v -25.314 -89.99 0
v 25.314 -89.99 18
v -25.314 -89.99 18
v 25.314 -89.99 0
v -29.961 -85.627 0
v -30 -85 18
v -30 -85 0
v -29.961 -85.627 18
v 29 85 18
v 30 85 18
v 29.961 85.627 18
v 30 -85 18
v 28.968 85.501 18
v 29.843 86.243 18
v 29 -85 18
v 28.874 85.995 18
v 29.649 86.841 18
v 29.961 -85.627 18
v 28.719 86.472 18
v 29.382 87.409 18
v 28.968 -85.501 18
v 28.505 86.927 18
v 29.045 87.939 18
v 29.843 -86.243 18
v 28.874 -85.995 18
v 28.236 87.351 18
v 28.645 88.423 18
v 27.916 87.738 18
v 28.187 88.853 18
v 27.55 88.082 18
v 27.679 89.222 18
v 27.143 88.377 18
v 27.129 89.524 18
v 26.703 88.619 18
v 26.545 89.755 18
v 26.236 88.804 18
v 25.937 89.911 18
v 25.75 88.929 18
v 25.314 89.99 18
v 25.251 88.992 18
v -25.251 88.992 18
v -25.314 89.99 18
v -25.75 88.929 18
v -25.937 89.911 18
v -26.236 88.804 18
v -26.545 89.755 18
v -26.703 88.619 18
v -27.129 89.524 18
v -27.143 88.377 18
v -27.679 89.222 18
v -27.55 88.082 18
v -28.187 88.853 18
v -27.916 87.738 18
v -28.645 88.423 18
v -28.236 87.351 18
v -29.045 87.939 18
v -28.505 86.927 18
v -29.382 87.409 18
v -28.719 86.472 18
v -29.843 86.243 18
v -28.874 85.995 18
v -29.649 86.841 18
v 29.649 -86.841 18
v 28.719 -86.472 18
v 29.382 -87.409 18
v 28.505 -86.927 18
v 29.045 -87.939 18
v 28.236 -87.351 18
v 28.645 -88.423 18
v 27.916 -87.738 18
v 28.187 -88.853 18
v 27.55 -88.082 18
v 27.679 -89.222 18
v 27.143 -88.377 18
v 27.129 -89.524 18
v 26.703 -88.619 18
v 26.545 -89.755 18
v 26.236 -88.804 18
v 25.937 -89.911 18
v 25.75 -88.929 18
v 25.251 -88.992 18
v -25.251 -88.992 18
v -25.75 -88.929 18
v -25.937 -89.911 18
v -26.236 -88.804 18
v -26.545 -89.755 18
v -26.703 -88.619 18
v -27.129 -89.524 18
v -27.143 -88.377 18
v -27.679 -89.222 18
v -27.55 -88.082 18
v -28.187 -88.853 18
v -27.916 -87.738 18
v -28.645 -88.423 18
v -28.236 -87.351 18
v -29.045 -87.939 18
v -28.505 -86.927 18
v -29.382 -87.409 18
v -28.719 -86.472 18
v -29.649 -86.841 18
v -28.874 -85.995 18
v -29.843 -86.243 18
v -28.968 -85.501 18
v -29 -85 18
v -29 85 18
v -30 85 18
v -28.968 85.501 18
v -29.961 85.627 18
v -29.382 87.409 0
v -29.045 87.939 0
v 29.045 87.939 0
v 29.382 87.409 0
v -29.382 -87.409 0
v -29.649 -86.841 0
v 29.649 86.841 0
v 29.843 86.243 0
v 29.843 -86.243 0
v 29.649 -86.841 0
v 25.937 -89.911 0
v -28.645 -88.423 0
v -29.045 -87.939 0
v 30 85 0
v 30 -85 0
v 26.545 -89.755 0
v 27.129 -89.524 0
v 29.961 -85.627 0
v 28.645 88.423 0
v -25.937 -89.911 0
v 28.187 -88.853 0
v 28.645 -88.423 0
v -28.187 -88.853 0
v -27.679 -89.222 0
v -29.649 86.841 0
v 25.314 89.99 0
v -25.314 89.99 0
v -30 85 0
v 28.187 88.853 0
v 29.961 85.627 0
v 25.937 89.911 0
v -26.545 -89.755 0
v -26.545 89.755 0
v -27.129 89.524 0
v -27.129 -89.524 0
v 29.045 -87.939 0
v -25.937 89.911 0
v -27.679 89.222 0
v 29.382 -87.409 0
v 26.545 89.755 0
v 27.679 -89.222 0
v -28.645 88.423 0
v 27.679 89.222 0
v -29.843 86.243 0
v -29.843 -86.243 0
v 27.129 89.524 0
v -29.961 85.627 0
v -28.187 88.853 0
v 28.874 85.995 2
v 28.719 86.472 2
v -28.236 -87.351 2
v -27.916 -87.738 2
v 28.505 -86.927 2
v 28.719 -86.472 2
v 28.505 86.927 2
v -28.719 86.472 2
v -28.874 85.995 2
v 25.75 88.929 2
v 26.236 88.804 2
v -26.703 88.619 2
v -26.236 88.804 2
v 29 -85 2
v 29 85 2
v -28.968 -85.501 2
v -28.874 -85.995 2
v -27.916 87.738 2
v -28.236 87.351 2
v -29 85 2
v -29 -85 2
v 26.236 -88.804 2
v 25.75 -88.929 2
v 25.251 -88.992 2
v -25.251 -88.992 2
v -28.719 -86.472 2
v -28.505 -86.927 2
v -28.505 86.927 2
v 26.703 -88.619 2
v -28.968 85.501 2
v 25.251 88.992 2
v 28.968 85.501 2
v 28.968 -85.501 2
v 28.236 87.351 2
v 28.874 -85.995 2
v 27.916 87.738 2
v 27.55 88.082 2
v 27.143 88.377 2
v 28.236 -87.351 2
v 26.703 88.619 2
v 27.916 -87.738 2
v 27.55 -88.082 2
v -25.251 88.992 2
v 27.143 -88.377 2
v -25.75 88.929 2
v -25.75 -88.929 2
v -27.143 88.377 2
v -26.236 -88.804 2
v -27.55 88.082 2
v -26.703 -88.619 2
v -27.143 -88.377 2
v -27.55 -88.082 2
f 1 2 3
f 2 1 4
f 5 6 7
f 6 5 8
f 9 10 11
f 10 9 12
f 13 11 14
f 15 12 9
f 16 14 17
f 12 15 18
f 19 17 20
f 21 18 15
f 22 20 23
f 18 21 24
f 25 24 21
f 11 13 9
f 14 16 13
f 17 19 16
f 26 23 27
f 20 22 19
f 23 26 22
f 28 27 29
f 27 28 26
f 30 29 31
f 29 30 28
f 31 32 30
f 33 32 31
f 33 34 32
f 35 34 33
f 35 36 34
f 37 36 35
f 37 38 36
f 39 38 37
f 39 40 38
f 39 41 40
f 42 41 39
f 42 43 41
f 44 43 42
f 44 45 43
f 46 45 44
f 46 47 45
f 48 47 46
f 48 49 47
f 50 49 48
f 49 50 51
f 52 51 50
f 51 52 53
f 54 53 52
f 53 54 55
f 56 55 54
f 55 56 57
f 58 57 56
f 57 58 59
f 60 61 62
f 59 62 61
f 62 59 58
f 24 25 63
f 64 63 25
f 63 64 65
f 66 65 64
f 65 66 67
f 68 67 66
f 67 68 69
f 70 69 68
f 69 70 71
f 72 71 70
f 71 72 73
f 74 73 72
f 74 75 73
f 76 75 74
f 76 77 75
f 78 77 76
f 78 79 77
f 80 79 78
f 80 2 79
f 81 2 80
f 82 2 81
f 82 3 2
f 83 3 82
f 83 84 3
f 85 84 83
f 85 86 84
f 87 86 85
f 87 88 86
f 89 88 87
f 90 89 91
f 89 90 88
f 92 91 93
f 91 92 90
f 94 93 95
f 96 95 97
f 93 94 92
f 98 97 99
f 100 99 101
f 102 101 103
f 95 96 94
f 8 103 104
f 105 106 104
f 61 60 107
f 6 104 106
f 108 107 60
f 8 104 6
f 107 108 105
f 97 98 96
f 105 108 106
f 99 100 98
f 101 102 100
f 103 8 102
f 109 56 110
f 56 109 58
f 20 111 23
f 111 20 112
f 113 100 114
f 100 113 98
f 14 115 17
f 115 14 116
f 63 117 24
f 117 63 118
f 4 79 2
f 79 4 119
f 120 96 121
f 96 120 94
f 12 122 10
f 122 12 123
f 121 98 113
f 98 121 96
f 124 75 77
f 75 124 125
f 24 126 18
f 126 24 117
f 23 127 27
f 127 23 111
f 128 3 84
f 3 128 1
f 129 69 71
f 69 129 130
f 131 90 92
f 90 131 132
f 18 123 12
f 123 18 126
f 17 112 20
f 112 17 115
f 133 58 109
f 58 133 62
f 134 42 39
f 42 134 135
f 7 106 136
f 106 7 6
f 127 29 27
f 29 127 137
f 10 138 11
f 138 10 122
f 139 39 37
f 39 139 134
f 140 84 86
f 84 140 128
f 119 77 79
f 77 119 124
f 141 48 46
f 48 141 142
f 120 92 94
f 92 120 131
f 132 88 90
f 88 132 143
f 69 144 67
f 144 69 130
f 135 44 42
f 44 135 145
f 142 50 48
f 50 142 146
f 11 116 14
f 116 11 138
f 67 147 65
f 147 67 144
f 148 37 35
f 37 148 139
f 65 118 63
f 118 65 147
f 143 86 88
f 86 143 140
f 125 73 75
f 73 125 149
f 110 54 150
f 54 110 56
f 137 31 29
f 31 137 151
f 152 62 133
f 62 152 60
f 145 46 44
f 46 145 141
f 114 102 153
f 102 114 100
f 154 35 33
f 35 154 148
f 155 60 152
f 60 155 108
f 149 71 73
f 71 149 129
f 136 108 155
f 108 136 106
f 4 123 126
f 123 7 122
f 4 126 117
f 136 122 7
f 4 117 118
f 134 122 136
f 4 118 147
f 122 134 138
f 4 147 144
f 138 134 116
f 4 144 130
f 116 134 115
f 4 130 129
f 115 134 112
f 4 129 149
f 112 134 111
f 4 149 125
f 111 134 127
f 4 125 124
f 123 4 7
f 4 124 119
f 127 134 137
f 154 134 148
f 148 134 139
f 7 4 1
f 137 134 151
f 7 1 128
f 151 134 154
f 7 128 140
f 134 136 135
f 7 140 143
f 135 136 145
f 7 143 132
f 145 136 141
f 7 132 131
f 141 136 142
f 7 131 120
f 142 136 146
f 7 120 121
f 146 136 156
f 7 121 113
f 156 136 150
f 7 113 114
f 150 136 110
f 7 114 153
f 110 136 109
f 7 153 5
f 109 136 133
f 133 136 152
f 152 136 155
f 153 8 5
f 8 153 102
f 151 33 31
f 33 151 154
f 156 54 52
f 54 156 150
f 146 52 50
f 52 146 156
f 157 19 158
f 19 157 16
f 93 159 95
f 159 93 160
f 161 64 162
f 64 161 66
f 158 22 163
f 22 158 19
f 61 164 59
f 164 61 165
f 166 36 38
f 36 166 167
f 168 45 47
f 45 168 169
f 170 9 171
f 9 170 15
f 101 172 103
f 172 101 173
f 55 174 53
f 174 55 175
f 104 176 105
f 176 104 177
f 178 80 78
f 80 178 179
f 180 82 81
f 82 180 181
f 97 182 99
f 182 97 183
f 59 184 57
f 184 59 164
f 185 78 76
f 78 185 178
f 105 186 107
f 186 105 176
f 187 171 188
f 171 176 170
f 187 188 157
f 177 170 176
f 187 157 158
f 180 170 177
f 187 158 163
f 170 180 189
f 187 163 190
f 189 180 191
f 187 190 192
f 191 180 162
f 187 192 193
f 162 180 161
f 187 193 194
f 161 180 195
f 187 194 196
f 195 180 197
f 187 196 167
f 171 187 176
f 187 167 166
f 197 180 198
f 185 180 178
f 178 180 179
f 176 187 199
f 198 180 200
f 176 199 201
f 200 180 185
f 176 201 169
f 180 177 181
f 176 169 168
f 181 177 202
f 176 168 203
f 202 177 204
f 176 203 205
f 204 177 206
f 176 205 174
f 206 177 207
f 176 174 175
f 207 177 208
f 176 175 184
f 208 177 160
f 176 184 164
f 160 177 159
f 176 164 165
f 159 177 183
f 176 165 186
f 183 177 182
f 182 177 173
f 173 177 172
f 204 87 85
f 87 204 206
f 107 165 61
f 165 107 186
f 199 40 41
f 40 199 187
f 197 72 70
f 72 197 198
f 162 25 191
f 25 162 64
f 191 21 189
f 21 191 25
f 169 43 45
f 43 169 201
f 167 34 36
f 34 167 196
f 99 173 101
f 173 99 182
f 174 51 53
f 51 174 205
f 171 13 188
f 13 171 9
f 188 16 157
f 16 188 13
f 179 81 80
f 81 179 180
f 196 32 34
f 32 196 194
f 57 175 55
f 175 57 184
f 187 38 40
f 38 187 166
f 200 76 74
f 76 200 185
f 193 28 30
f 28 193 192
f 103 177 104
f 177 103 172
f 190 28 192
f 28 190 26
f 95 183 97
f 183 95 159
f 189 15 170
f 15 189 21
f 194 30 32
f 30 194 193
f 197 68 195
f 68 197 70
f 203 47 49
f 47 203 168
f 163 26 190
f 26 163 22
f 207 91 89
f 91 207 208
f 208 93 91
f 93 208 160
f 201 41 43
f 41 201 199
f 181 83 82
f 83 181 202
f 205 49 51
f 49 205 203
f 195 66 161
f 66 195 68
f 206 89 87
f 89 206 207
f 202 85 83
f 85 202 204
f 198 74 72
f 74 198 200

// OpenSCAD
$fn = 50;


difference() {
	union() {
		hull() {
			translate(v = [-25.0000000000, 85.0000000000, 0]) {
				cylinder(h = 18, r = 5);
			}
			translate(v = [25.0000000000, 85.0000000000, 0]) {
				cylinder(h = 18, r = 5);
			}
			translate(v = [-25.0000000000, -85.0000000000, 0]) {
				cylinder(h = 18, r = 5);
			}
			translate(v = [25.0000000000, -85.0000000000, 0]) {
				cylinder(h = 18, r = 5);
			}
		}
	}
	union() {
		translate(v = [0, 0, 2]) {
			hull() {
				translate(v = [-25.0000000000, 85.0000000000, 0]) {
					cylinder(h = 16, r = 4);
				}
				translate(v = [25.0000000000, 85.0000000000, 0]) {
					cylinder(h = 16, r = 4);
				}
				translate(v = [-25.0000000000, -85.0000000000, 0]) {
					cylinder(h = 16, r = 4);
				}
				translate(v = [25.0000000000, -85.0000000000, 0]) {
					cylinder(h = 16, r = 4);
				}
			}
		}
	}
}
